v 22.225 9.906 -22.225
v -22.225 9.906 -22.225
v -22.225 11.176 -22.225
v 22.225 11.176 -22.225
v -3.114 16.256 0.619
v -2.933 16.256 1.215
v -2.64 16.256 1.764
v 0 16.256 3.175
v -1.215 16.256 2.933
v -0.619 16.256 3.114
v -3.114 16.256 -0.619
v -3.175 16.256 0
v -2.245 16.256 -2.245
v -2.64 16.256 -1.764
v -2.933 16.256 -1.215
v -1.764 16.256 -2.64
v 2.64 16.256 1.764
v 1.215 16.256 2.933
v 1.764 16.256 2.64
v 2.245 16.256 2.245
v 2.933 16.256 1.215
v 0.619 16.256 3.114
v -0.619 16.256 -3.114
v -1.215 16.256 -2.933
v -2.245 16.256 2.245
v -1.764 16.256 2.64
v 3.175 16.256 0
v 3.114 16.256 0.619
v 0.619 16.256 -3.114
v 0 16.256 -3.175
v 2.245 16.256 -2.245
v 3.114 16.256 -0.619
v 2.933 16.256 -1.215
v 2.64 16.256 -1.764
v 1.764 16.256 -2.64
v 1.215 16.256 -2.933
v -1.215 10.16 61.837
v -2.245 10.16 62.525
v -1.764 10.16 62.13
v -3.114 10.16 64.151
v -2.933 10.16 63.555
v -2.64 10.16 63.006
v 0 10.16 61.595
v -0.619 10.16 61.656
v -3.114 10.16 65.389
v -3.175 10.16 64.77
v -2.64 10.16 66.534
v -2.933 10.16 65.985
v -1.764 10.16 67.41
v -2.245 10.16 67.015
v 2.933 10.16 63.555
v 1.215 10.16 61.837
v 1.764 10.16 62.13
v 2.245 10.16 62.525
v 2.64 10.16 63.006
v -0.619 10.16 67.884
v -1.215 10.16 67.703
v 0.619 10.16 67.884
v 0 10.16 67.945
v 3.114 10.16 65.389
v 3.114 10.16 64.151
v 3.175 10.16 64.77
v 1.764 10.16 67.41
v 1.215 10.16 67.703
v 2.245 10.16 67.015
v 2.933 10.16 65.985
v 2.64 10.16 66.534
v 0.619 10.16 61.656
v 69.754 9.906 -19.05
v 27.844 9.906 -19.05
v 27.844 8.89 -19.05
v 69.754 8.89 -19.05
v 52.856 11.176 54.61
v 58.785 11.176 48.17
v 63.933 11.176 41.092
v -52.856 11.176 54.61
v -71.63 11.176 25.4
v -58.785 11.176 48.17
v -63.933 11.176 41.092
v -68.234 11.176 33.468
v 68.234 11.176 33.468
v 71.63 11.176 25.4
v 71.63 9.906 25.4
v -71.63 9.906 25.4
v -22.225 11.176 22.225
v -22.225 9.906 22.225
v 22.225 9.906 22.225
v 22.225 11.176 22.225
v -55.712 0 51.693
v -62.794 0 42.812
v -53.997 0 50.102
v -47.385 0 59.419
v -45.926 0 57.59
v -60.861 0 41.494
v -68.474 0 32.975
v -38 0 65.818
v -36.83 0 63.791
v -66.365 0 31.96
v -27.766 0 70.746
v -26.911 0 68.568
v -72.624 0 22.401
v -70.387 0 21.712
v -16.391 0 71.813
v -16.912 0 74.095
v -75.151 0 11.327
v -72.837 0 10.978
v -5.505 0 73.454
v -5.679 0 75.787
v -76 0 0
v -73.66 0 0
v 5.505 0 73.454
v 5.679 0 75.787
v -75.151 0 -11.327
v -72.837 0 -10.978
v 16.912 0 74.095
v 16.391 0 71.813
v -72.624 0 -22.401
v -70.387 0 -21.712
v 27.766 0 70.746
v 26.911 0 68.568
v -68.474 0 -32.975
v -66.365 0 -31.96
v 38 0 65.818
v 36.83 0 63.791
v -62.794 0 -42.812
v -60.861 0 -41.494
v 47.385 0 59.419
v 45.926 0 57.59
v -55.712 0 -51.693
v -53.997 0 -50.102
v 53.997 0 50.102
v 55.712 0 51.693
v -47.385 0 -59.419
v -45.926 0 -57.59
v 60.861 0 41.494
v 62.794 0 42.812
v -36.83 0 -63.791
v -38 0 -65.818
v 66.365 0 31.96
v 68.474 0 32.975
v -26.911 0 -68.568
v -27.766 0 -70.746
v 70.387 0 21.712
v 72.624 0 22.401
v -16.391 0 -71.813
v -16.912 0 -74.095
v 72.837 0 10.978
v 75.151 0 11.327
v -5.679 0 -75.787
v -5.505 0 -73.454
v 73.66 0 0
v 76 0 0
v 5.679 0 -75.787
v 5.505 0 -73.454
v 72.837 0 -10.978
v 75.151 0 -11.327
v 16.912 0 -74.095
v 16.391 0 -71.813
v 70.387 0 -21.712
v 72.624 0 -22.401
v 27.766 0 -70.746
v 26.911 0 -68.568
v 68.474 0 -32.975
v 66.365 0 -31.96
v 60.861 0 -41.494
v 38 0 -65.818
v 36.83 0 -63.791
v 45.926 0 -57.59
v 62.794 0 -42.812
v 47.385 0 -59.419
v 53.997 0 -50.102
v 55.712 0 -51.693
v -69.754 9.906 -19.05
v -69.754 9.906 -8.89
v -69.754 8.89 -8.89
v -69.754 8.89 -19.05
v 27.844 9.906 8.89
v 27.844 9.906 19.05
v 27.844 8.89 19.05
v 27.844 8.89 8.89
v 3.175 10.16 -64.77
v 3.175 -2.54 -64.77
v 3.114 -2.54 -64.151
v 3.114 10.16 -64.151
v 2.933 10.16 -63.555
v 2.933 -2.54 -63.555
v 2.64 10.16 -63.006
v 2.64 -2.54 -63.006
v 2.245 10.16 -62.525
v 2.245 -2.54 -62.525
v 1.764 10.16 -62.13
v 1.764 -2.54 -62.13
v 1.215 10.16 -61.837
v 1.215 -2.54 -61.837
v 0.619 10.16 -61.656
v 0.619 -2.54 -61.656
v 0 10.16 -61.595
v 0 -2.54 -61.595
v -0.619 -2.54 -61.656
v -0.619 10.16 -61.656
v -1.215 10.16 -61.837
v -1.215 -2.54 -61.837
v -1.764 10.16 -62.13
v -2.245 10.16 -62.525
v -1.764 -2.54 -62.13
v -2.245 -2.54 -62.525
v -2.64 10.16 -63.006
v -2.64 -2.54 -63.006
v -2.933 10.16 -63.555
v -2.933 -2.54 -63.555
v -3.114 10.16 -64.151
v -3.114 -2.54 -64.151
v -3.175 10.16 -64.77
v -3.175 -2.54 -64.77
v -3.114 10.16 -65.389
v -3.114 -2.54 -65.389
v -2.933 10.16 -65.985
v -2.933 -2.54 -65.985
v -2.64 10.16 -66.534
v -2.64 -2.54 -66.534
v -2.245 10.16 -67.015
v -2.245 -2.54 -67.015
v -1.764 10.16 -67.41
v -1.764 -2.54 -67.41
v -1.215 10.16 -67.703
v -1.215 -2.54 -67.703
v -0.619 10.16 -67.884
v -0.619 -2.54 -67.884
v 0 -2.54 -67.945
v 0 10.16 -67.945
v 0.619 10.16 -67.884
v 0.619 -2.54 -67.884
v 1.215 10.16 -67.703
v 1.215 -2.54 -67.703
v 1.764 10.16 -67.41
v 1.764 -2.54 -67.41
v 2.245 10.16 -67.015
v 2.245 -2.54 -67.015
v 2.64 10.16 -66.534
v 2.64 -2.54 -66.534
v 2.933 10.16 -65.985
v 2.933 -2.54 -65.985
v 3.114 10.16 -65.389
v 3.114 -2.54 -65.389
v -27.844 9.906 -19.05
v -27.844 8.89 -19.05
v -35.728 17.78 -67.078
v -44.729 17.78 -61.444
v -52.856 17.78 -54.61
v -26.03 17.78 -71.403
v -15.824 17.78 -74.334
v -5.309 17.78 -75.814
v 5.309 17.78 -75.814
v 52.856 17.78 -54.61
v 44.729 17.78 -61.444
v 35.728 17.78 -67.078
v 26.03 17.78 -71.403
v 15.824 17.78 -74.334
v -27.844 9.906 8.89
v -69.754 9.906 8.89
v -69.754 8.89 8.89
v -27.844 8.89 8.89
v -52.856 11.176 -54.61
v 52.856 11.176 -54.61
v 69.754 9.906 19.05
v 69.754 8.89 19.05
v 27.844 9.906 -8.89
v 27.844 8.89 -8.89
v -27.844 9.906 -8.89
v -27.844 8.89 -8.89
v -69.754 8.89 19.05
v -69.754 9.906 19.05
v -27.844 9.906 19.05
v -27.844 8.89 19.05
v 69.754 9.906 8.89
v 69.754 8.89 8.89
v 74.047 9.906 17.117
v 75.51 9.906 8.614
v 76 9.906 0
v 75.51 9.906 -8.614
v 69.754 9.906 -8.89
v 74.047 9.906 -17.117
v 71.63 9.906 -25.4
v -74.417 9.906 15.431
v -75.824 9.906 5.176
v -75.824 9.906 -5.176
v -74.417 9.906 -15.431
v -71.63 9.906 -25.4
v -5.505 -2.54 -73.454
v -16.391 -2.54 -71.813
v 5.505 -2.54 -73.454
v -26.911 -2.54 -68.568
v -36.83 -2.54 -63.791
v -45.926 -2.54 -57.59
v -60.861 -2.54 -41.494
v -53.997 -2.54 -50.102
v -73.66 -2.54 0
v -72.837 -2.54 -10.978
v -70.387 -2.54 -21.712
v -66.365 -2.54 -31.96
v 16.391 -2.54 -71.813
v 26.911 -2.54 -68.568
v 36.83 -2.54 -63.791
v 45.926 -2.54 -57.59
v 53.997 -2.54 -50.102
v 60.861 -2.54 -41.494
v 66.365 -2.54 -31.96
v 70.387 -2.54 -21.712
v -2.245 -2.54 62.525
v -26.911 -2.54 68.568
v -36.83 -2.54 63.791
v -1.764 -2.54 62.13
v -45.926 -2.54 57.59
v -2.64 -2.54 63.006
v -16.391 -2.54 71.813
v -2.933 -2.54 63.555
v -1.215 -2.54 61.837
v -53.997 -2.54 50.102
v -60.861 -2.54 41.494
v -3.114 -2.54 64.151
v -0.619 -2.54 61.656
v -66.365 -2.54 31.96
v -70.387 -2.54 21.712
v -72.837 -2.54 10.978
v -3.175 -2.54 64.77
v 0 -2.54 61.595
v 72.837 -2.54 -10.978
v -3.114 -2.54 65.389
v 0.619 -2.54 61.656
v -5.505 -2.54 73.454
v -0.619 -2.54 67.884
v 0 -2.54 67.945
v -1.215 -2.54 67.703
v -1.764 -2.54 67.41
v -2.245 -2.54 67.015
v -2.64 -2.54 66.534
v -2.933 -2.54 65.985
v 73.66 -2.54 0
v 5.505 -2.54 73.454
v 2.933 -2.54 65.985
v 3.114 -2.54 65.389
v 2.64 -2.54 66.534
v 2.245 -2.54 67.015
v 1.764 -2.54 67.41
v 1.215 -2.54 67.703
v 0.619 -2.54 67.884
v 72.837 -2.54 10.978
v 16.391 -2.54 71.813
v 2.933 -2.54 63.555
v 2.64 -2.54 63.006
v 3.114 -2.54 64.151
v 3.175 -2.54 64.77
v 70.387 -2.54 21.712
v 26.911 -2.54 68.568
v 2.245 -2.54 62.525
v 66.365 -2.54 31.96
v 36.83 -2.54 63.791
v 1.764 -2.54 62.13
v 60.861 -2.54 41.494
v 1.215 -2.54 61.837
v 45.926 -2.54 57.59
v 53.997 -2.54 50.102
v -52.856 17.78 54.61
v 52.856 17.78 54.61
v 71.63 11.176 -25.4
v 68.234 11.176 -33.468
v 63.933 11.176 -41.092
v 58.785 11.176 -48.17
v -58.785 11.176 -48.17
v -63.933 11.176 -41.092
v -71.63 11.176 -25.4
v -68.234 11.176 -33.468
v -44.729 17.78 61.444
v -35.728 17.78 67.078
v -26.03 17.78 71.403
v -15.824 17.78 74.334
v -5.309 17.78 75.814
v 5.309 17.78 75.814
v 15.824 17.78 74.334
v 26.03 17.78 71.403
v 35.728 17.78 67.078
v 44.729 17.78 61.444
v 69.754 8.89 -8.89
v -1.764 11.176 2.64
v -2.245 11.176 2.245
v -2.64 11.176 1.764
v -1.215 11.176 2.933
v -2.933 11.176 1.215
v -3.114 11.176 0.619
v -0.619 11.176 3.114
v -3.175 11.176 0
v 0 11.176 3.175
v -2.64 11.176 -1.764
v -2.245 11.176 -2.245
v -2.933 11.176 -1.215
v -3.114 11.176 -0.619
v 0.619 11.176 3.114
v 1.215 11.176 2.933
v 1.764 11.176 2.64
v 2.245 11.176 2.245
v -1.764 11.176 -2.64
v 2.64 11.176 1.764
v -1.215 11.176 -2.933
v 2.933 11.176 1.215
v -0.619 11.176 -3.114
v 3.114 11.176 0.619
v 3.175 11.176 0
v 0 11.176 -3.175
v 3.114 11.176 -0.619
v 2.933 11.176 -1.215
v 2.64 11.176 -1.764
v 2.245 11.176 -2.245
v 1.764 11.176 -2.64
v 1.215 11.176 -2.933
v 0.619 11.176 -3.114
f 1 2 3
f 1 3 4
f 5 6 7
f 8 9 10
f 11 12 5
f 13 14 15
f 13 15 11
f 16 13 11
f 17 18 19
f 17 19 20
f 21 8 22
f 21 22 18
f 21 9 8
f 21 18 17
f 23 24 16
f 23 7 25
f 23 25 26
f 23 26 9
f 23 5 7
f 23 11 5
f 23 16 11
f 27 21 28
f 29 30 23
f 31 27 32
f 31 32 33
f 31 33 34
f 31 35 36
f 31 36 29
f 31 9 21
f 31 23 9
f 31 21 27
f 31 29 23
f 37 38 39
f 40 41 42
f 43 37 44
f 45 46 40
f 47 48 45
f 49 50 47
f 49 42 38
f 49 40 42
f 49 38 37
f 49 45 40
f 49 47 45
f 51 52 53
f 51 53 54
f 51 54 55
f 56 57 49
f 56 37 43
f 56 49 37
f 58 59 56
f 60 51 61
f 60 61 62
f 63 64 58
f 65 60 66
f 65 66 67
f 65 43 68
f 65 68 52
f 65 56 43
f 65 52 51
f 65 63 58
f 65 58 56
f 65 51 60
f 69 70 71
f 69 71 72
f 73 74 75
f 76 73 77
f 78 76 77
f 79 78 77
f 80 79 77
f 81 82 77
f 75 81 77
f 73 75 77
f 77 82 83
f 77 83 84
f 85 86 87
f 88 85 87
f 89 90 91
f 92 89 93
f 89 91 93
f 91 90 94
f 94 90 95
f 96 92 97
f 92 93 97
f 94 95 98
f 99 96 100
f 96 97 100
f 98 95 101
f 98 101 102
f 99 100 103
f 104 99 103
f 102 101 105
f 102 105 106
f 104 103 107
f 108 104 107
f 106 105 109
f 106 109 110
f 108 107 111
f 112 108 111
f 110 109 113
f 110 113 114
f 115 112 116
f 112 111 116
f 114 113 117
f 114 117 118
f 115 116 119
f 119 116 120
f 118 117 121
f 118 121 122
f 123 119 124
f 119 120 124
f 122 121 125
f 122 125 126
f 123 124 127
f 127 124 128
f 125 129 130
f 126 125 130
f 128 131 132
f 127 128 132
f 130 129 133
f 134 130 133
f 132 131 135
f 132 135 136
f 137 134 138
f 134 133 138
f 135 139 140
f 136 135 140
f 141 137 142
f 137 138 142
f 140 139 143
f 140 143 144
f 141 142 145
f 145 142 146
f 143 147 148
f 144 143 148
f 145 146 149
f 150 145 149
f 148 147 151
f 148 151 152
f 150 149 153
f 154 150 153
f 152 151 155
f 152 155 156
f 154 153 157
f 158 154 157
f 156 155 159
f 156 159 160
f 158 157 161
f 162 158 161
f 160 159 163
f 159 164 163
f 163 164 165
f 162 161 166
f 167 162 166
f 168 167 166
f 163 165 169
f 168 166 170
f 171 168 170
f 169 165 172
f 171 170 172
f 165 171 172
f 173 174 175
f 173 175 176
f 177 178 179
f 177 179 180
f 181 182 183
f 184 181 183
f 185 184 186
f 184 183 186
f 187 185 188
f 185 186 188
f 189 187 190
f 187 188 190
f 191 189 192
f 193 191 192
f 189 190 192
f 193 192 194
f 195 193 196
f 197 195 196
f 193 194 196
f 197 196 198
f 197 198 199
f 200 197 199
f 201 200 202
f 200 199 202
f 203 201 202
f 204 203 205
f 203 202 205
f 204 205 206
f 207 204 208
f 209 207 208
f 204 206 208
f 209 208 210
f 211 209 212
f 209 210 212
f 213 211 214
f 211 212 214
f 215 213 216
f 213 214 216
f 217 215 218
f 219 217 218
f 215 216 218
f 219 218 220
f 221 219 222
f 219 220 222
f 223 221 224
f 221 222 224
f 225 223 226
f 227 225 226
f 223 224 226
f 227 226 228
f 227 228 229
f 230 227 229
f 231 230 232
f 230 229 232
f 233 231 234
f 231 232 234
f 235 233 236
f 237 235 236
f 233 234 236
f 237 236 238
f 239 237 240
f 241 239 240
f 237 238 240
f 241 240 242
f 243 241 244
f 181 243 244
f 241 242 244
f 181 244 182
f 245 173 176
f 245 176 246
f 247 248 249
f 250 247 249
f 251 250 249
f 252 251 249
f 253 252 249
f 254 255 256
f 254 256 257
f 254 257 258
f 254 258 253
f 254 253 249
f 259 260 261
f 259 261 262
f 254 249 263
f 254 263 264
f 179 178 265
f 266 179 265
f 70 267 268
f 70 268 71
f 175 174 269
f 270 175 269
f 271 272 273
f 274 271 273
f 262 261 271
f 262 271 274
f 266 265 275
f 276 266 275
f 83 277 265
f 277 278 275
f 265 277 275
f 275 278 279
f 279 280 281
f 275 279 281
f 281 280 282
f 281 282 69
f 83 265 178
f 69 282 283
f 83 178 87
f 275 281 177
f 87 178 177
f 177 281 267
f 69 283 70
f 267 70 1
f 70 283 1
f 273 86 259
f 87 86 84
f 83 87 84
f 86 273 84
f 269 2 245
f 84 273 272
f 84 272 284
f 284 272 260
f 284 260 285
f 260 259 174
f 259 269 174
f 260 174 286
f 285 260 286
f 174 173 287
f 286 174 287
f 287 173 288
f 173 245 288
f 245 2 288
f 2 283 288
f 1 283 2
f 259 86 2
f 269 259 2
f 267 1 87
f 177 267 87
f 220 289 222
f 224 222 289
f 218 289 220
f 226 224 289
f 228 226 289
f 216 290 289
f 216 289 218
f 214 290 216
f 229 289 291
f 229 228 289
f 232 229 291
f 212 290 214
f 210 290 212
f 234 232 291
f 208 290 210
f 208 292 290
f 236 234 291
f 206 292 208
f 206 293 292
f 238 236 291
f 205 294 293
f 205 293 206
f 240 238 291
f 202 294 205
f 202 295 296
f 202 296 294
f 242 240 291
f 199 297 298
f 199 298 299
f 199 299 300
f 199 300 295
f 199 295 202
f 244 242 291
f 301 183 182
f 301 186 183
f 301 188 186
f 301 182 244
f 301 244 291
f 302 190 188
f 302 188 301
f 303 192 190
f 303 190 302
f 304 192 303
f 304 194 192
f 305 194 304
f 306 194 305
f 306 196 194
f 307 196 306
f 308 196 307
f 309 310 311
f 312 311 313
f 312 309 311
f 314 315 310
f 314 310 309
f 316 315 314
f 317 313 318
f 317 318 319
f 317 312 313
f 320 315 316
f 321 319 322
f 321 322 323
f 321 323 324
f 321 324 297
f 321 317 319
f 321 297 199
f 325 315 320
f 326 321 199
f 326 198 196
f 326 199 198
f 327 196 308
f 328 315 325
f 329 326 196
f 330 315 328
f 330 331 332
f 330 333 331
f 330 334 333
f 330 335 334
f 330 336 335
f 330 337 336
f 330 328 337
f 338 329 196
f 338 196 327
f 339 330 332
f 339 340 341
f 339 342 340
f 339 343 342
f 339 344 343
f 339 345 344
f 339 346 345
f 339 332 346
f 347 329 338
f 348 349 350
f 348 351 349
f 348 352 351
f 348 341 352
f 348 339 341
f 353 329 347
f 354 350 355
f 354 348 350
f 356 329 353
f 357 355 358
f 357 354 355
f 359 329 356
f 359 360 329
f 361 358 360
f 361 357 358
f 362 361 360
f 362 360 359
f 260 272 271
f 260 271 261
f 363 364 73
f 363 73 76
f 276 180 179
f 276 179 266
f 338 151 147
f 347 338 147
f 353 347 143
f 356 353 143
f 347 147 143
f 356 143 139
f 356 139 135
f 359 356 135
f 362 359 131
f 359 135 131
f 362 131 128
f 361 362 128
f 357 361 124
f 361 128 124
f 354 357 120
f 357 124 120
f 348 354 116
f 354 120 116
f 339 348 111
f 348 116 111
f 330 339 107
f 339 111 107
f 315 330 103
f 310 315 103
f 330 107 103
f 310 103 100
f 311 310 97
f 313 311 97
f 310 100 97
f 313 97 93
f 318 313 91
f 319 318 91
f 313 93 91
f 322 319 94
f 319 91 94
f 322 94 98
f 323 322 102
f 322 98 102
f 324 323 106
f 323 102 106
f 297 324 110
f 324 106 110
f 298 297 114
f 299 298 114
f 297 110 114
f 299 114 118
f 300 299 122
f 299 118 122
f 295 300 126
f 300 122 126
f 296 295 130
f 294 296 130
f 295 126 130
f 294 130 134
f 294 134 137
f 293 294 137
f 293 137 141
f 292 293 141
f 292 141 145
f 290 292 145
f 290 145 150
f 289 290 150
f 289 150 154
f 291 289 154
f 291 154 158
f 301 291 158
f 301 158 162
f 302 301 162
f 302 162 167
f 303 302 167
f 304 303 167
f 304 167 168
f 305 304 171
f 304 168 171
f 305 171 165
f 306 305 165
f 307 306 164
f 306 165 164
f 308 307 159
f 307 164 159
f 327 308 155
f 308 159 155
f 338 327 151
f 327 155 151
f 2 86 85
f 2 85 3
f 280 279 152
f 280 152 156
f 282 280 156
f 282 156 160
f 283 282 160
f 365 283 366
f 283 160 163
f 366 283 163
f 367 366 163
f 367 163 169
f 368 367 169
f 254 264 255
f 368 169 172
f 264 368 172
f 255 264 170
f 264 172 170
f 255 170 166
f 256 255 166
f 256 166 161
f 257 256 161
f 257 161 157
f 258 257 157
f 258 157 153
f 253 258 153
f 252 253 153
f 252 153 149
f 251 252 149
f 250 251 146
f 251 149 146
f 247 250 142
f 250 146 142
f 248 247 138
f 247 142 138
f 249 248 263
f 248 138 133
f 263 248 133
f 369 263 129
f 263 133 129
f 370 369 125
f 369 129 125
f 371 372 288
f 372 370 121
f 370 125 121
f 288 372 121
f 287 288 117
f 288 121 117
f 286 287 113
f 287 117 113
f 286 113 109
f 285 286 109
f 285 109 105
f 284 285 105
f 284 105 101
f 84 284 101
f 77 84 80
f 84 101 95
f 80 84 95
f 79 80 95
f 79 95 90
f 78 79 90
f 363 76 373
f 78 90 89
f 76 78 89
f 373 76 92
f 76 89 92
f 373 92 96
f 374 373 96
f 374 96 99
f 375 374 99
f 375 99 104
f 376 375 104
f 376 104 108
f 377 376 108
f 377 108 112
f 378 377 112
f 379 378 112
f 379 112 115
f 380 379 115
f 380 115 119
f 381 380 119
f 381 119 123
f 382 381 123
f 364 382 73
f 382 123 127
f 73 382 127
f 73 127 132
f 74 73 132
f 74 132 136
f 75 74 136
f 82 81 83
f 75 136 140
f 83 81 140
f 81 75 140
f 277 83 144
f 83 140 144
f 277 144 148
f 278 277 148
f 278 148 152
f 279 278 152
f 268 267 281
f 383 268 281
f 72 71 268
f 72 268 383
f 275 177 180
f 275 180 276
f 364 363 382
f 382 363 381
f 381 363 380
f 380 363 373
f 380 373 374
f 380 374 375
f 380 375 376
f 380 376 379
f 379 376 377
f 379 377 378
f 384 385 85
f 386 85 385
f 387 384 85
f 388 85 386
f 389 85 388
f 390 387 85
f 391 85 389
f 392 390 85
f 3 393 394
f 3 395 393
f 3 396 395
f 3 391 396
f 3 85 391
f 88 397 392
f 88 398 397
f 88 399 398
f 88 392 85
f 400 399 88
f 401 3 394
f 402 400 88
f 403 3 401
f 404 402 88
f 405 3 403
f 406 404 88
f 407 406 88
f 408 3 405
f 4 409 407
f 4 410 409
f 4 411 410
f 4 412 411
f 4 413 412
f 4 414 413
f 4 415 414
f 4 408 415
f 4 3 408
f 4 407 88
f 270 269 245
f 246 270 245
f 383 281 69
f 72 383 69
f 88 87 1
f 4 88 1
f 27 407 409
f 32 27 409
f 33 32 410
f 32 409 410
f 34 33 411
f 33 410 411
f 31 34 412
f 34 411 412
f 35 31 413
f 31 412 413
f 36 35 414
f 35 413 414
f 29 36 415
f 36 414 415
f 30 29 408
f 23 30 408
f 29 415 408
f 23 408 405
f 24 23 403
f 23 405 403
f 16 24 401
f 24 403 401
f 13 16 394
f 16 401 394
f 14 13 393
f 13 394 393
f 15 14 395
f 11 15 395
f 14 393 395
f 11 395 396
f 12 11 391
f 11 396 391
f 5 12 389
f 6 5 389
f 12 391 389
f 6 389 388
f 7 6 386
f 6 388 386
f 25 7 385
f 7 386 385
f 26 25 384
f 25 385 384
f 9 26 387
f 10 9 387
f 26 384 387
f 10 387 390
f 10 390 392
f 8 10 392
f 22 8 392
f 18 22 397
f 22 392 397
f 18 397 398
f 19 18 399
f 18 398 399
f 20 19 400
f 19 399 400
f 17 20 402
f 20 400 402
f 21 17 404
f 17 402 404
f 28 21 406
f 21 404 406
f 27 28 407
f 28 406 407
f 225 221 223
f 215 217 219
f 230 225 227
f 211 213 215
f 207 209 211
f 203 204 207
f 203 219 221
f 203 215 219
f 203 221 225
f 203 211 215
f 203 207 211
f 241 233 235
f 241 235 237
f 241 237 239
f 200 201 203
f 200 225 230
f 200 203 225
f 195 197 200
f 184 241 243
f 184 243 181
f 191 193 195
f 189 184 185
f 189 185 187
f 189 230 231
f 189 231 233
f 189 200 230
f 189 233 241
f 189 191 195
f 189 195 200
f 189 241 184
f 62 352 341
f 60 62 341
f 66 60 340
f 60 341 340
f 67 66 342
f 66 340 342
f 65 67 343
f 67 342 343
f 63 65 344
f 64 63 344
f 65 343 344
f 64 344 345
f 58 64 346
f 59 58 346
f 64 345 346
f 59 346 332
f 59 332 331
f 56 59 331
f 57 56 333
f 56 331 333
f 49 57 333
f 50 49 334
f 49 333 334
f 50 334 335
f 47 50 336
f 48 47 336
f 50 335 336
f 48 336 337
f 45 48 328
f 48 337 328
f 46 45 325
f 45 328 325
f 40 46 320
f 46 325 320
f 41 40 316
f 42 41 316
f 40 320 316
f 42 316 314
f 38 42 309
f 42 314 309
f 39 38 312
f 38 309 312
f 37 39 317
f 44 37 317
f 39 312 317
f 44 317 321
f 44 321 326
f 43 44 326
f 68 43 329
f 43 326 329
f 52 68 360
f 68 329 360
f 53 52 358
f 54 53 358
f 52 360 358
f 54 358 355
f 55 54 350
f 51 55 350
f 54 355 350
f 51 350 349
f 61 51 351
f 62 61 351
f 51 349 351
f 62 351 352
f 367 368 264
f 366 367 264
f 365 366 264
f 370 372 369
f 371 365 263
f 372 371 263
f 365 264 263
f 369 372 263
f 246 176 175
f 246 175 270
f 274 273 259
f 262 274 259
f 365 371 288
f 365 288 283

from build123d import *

# Parameters (mm, degrees)
SKETCH2_R           = 76
BOSS_EXTRUDE1_DEPTH = 17.78
CUT_EXTRUDE3_DEPTH  = 6.604
CUT_EXTRUDE5_DEPTH  = 1.27
SKETCH10_W          = 41.91
SKETCH10_H          = 10.16
CUT_EXTRUDE6_DEPTH  = 1.016
SKETCH11_W          = 44.45
SKETCH11_H          = 44.45
BOSS_EXTRUDE2_DEPTH = 1.27
SKETCH14_R          = 3.175
BOSS_EXTRUDE4_DEPTH = 5.08
SKETCH15_R          = 73.66
BOSS_EXTRUDE5_DEPTH = 2.54
SKETCH16_R          = 3.175
CUT_EXTRUDE8_DEPTH  = 12.7


with BuildPart() as part:
    # Sketch2 → Boss-Extrude1 (new body)
    with BuildSketch(Plane(origin=(0, 0, 0), x_dir=(1, 0, 0), z_dir=(0, 1, 0))):
        Circle(SKETCH2_R)
    extrude(amount=BOSS_EXTRUDE1_DEPTH)

    # Sketch6 → Cut-Extrude3 (cut)
    with BuildSketch(Plane(origin=(0, 17.78, 0), x_dir=(1, 0, 0), z_dir=(0, 1, 0))):
        with BuildLine():
            Line((-76, 54.61), (76, 54.61))
            ThreePointArc((76, 54.61), (130.61, 0), (76, -54.61))
            Line((76, -54.61), (-76, -54.61))
            ThreePointArc((-76, -54.61), (-130.61, 0), (-76, 54.61))
        make_face()
    extrude(amount=-CUT_EXTRUDE3_DEPTH, mode=Mode.SUBTRACT)

    # Sketch9 → Cut-Extrude5 (cut)
    with BuildSketch(Plane(origin=(0, 11.176, 0), x_dir=(1, 0, 0), z_dir=(0, 1, 0))):
        with BuildLine():
            Line((-76, 25.4), (-25.4, 25.4))
            Line((-25.4, 25.4), (25.4, 25.4))
            Line((25.4, 25.4), (76, 25.4))
            ThreePointArc((76, 25.4), (101.4, 0), (76, -25.4))
            Line((76, -25.4), (25.4, -25.4))
            Line((25.4, -25.4), (-25.4, -25.4))
            Line((-25.4, -25.4), (-76, -25.4))
            ThreePointArc((-76, -25.4), (-101.4, 0), (-76, 25.4))
        make_face()
    extrude(amount=-CUT_EXTRUDE5_DEPTH, mode=Mode.SUBTRACT)

    # Sketch10 → Cut-Extrude6 (cut)
    with BuildSketch(Plane(origin=(0, 9.906, 0), x_dir=(1, 0, 0), z_dir=(0, 1, 0))):
        with Locations((-48.79885899, 13.97)):
            Rectangle(SKETCH10_W, SKETCH10_H)
        with Locations((-48.79885899, -13.97)):
            Rectangle(SKETCH10_W, SKETCH10_H)
        with Locations((48.79885899, -13.97)):
            Rectangle(SKETCH10_W, SKETCH10_H)
        with Locations((48.79885899, 13.97)):
            Rectangle(SKETCH10_W, SKETCH10_H)
    extrude(amount=-CUT_EXTRUDE6_DEPTH, mode=Mode.SUBTRACT)

    # Sketch11 → Boss-Extrude2 (add)
    with BuildSketch(Plane(origin=(0, 9.906, 0), x_dir=(1, 0, 0), z_dir=(0, 1, 0))):
        Rectangle(SKETCH11_W, SKETCH11_H)
    extrude(amount=BOSS_EXTRUDE2_DEPTH)

    # Sketch14 → Boss-Extrude4 (add)
    with BuildSketch(Plane(origin=(0, 11.176, 0), x_dir=(1, 0, 0), z_dir=(0, 1, 0))):
        Circle(SKETCH14_R)
    extrude(amount=BOSS_EXTRUDE4_DEPTH)

    # Sketch15 → Boss-Extrude5 (add)
    with BuildSketch(Plane.XZ):
        Circle(SKETCH15_R)
    extrude(amount=BOSS_EXTRUDE5_DEPTH)

    # Sketch16 → Cut-Extrude8 (cut)
    with BuildSketch(Plane.XZ.offset(2.54)):
        with Locations((0, 64.77)):
            Circle(SKETCH16_R)
        with Locations((0, -64.77)):
            Circle(SKETCH16_R)
    extrude(amount=-CUT_EXTRUDE8_DEPTH, mode=Mode.SUBTRACT)


solid = part.part
